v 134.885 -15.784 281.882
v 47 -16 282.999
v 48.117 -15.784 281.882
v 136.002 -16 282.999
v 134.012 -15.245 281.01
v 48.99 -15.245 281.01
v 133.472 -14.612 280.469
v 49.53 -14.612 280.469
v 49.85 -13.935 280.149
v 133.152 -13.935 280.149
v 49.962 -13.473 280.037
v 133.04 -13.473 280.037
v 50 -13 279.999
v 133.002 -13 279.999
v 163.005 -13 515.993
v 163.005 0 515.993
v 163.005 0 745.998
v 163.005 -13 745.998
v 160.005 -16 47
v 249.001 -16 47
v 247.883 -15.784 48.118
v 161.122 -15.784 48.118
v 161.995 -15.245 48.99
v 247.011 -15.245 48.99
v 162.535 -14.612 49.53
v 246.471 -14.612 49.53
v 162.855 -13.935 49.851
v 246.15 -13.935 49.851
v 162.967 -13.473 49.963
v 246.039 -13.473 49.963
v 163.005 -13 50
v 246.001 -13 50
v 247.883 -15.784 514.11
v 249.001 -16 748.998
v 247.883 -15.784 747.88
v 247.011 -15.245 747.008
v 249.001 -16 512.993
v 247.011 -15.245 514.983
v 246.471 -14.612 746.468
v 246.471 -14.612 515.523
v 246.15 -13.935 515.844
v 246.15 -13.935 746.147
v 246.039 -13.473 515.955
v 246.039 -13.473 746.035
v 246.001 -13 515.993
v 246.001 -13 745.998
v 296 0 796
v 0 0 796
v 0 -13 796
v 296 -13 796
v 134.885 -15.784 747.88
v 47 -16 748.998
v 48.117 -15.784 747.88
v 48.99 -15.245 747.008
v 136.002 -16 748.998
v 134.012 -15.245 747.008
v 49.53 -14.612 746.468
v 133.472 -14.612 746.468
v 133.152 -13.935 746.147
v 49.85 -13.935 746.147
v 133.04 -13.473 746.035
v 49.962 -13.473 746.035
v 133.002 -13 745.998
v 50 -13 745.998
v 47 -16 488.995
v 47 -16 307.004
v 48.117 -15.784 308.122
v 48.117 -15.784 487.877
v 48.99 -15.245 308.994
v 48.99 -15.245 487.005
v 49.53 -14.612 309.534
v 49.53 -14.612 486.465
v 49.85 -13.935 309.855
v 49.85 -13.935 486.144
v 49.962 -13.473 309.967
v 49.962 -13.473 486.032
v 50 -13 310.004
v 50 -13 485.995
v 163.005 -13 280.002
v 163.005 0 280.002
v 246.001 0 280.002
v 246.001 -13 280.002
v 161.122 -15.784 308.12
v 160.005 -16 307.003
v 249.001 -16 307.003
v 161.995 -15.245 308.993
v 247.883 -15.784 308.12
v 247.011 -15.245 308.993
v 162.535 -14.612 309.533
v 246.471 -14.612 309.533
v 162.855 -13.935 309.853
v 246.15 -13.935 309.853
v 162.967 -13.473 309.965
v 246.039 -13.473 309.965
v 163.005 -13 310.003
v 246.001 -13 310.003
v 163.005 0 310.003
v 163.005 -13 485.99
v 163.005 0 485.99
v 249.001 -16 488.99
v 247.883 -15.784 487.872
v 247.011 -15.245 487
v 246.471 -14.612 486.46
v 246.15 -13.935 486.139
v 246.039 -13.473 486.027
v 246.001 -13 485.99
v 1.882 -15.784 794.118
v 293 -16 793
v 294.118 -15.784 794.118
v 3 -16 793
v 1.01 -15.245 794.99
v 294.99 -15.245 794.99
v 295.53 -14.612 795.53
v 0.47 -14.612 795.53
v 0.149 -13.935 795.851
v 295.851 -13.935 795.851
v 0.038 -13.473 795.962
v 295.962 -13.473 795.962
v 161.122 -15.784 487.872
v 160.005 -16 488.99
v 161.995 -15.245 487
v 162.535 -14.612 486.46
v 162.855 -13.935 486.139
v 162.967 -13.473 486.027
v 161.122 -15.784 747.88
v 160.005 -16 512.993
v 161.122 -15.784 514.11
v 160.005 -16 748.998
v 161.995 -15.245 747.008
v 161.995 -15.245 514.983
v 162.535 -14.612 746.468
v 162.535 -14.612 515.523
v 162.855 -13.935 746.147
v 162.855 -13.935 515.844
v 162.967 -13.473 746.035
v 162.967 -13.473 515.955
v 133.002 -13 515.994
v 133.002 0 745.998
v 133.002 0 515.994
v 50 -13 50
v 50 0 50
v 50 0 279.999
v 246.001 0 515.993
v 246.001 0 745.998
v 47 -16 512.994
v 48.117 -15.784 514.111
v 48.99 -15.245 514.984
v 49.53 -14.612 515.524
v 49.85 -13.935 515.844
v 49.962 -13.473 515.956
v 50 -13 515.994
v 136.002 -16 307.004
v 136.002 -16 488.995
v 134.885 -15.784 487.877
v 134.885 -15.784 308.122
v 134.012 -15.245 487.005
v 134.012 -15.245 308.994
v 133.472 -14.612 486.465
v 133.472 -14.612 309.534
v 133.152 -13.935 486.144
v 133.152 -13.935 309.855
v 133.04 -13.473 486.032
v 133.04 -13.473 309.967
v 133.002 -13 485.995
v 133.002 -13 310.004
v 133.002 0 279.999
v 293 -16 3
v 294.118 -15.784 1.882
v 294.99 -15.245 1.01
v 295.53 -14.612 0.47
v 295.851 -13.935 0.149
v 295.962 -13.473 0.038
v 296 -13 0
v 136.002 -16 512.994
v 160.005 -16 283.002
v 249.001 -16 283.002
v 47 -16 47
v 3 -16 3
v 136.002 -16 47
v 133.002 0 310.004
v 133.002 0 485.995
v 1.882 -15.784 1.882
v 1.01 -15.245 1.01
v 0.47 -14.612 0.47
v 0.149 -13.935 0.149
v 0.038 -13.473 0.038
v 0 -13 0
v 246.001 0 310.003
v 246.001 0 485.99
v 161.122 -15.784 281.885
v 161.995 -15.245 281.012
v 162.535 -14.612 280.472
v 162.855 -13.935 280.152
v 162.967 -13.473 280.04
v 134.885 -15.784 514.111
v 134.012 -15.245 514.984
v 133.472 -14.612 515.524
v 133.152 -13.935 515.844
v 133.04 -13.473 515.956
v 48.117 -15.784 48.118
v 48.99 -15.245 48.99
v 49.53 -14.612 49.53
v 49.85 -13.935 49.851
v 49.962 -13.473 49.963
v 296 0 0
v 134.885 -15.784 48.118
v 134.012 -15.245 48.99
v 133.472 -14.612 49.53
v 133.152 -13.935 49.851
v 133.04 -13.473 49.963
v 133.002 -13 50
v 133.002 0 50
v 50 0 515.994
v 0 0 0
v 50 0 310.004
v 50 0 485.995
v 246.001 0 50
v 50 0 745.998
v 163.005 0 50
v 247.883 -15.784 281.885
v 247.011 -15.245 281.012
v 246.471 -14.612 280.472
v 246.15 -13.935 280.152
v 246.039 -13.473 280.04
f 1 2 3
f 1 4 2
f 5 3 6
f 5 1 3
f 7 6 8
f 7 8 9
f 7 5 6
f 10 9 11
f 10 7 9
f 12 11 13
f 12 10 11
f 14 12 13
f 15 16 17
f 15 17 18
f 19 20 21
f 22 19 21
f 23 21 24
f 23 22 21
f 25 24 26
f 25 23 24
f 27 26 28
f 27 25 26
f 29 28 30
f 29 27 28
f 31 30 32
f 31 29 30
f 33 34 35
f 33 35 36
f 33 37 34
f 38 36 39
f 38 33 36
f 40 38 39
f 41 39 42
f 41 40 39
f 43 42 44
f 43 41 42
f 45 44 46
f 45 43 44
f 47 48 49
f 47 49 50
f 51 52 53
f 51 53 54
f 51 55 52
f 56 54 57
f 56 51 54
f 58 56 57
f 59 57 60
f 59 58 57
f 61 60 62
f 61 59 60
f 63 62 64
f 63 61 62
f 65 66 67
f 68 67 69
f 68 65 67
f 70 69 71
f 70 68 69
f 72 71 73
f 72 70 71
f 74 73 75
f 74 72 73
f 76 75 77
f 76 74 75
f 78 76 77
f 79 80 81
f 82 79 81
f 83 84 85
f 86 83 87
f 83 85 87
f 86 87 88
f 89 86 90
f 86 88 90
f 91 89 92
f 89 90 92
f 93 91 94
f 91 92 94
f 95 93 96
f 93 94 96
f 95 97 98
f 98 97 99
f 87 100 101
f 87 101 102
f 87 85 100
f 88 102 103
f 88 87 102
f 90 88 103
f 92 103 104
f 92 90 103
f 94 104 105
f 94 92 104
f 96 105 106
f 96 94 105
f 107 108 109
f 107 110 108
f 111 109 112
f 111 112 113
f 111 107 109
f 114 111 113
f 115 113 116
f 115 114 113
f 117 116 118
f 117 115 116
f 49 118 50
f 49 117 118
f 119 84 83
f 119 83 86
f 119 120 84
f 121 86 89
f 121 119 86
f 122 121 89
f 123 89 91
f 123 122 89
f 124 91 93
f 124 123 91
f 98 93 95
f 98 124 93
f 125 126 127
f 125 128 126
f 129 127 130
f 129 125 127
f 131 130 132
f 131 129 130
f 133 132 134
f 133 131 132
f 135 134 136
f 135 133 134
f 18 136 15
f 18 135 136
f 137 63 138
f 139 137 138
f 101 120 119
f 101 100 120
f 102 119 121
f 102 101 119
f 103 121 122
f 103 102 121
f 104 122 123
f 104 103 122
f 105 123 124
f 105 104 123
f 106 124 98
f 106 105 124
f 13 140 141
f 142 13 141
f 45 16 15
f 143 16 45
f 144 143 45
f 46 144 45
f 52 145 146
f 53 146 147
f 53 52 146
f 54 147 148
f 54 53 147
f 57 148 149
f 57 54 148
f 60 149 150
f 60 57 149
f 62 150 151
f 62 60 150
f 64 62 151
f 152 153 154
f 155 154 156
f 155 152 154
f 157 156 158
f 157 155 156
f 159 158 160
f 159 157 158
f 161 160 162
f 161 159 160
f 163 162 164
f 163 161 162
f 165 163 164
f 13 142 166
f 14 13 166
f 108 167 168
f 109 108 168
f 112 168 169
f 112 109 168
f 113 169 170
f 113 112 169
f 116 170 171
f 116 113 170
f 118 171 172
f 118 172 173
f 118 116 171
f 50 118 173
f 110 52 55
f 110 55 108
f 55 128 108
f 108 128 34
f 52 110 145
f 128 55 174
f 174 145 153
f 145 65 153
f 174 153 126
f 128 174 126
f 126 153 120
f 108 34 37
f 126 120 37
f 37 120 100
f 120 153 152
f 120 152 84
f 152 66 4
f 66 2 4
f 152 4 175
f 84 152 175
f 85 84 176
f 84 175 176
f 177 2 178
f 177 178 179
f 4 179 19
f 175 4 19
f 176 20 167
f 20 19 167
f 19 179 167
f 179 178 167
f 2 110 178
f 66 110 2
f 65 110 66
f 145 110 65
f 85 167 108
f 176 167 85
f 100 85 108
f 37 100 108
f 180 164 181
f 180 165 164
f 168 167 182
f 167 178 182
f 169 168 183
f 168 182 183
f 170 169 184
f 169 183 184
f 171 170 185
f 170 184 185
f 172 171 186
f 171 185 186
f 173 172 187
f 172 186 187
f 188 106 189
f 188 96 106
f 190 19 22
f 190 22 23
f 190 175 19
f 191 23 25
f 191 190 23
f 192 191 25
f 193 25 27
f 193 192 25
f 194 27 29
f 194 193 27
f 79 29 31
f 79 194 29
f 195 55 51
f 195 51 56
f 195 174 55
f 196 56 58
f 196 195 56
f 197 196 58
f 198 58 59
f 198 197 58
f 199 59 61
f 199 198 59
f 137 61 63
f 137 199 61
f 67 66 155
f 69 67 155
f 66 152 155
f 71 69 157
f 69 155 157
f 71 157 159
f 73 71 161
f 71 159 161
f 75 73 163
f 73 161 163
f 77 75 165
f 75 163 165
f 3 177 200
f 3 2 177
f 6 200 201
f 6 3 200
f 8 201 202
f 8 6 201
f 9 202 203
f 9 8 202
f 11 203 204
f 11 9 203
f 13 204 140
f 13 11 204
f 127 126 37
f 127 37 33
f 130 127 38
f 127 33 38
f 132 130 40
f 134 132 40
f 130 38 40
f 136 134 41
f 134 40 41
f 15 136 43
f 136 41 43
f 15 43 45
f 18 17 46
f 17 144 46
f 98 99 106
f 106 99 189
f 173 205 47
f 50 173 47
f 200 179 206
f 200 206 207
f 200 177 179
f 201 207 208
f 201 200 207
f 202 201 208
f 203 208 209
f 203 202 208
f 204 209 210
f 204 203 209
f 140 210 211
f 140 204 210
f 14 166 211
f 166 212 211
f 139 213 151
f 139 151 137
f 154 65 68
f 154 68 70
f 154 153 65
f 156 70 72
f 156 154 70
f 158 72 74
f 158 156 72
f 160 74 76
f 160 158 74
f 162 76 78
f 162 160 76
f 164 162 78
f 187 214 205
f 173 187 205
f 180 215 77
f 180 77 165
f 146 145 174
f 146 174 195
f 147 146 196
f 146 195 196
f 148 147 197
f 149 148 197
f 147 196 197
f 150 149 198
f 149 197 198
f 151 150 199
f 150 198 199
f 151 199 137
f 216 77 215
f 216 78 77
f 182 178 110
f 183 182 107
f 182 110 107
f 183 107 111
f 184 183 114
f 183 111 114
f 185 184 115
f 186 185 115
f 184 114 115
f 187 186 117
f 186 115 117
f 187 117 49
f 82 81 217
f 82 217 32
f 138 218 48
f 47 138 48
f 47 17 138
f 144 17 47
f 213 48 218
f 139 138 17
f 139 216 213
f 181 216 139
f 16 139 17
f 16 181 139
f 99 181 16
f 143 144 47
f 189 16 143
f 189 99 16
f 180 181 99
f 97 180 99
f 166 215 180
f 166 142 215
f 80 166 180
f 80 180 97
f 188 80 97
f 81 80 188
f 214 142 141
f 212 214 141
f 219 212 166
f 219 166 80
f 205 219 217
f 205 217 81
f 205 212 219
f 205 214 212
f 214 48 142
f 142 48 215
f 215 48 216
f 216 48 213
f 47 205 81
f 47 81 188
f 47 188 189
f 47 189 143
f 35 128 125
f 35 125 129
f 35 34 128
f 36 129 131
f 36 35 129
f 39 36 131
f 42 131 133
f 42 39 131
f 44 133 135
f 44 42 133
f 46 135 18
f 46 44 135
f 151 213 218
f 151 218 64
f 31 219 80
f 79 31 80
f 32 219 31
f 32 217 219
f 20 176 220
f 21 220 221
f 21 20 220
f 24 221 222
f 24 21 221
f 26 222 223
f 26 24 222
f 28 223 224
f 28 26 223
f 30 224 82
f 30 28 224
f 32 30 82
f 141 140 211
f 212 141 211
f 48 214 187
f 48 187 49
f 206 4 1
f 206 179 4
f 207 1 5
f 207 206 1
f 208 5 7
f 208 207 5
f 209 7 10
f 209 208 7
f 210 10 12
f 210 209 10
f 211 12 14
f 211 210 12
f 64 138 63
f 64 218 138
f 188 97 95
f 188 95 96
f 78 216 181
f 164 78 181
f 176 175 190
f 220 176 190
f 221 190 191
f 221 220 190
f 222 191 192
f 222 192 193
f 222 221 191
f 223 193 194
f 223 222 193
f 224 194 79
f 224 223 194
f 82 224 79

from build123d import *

# Parameters (mm, degrees)
F0_W      = 28.8499742746
F0_H      = 37.8827601671
F1_DEPTH  = 16
F2_DEPTH  = 296
F3_DEPTH  = 996
F4_W      = 199.8313069344
F4_H      = 801.1276721954
F5_DEPTH  = 5
F6_DEPTH  = 39.21
F7_DEPTH  = 2.24
F8_DEPTH  = 55.66
F9_DEPTH  = 1.59
F10_W     = 54.77245152
F10_H     = 895.9976721954
F11_DEPTH = 5
F12_DEPTH = 5.86
F13_DEPTH = 18.91
F14_W     = 83.0026693535
F14_H     = 34.9487662315
F14_H_2   = 55.274695158
F15_W     = 82.9961860609
F15_H     = 44.8832511902
F15_H_2   = 52.5203943253
F16_DEPTH = 5
F17_DEPTH = 300
F18_DEPTH = 300
F19_DEPTH = 324.79
F20_DEPTH = 324.79
F21_DEPTH = 250
F22_DEPTH = 250
F23_DEPTH = 100
F24_DEPTH = 100
F25_DEPTH = 50
F26_DEPTH = 50
F27_DEPTH = 134.02
F28_DEPTH = 100
F29_DEPTH = 100
F30_DEPTH = 100
F31_DEPTH = 50
F32_DEPTH = 54.95
F33_DEPTH = 50
F34_DEPTH = 109.29
F35_DEPTH = 14.88
F36_DEPTH = 230.15
F37_DEPTH = 230.15
F38_DEPTH = 22.52
F39_DEPTH = 77.2
F40_DEPTH = 77.2
F41_DEPTH = 11
F42_DEPTH = 200
F43_DEPTH = 200
F44_DEPTH = 200
F45_DEPTH = 70
F46_DEPTH = 70
F47_DEPTH = 70
F48_DEPTH = 70
F49_R     = 3


with BuildPart() as f1:
    # F0 (on Front) → F1 (new body)
    with BuildSketch(Plane.XZ):
        with Locations((14.4249871373, 18.9413800836)):
            Rectangle(F0_W, F0_H)
    extrude(amount=F1_DEPTH)

    # F2 (add): a face of the model
    f2_faces = [f1.faces().sort_by_distance(p)[0] for p in [
        (0, -8, 18.9413800836),
    ]]
    extrude(f2_faces, amount=-F2_DEPTH)

    # F3 (add): a face of the model
    f3_faces = [f1.faces().sort_by_distance(p)[0] for p in [
        (148, -8, 0),
    ]]
    extrude(f3_faces, amount=-F3_DEPTH)

    # F4 (on face) → F5 (cut)
    with BuildSketch(Plane.XZ.offset(16)):
        with Locations((148.3252942562, 506.2239170074)):
            Rectangle(F4_W, F4_H)
    extrude(amount=-F5_DEPTH, mode=Mode.SUBTRACT)

    # F6 (cut): a face of the model
    f6_faces = [f1.faces().sort_by_distance(p)[0] for p in [
        (148.3252942562, -13.5, 906.7877531052),
    ]]
    extrude(f6_faces, amount=-F6_DEPTH, mode=Mode.SUBTRACT)

    # F7 (add): a face of the model
    f7_faces = [f1.faces().sort_by_distance(p)[0] for p in [
        (248.2409477234, -13.5, 525.8289170074),
    ]]
    extrude(f7_faces, amount=F7_DEPTH)

    # F8 (cut): a face of the model
    f8_faces = [f1.faces().sort_by_distance(p)[0] for p in [
        (147.2052942562, -13.5, 105.6600809097),
    ]]
    extrude(f8_faces, amount=-F8_DEPTH, mode=Mode.SUBTRACT)

    # F9 (add): a face of the model
    f9_faces = [f1.faces().sort_by_distance(p)[0] for p in [
        (48.409640789, -13.5, 497.9989170074),
    ]]
    extrude(f9_faces, amount=F9_DEPTH)

    # F10 (on face) → F11 (join)
    with BuildSketch(Plane.XZ.offset(11)):
        with Locations((154.5285359025, 497.9989170074)):
            Rectangle(F10_W, F10_H)
    extrude(amount=F11_DEPTH)

    # F12 (cut): a face of the model
    f12_faces = [f1.faces().sort_by_distance(p)[0] for p in [
        (127.1423101425, -13.5, 497.9989170074),
    ]]
    extrude(f12_faces, amount=-F12_DEPTH, mode=Mode.SUBTRACT)

    # F13 (cut): a face of the model
    f13_faces = [f1.faces().sort_by_distance(p)[0] for p in [
        (181.9147616625, -13.5, 497.9989170074),
    ]]
    extrude(f13_faces, amount=-F13_DEPTH, mode=Mode.SUBTRACT)

    # F14 (on face) + F15 (on face) → F16 (join)
    with BuildSketch(Plane.XZ.offset(11)):
        with Locations((91.5009754658, 853.3093035221)):
            Rectangle(F14_W, F14_H)
        with Locations((91.5009754658, 511.6568356752)):
            Rectangle(F14_W, F14_H_2)
    with BuildSketch(Plane.XZ.offset(11)):
        with Locations((204.5028546929, 853.7013530731)):
            Rectangle(F15_W, F15_H)
        with Locations((204.5028546929, 576.5425562859)):
            Rectangle(F15_W, F15_H_2)
    extrude(amount=F16_DEPTH)

    # F17 (add): faces of the model
    f17_faces = [f1.faces().sort_by_distance(p)[0] for p in [
        (204.5028546929, -13.5, 550.2823591232),
        (91.5009754658, -13.5, 484.0194880962),
    ]]
    extrude(f17_faces, amount=F17_DEPTH)

    # F18 (cut): faces of the model
    f18_faces = [f1.faces().sort_by_distance(p)[0] for p in [
        (91.5009754658, -13.5, 539.2941832542),
        (204.5028546929, -13.5, 602.8027534485),
    ]]
    extrude(f18_faces, amount=-F18_DEPTH, mode=Mode.SUBTRACT)

    # F19 (add): a face of the model
    f19_faces = [f1.faces().sort_by_distance(p)[0] for p in [
        (91.5009754658, -13.5, 835.8349204063),
    ]]
    extrude(f19_faces, amount=F19_DEPTH)

    # F20 (cut): a face of the model
    f20_faces = [f1.faces().sort_by_distance(p)[0] for p in [
        (91.5009754658, -13.5, 870.7836866379),
    ]]
    extrude(f20_faces, amount=-F20_DEPTH, mode=Mode.SUBTRACT)

    # F21 (add): a face of the model
    f21_faces = [f1.faces().sort_by_distance(p)[0] for p in [
        (91.5009754658, -13.5, 239.2941832542),
    ]]
    extrude(f21_faces, amount=F21_DEPTH)

    # F22 (cut): a face of the model
    f22_faces = [f1.faces().sort_by_distance(p)[0] for p in [
        (91.5009754658, -13.5, 184.0194880962),
    ]]
    extrude(f22_faces, amount=-F22_DEPTH, mode=Mode.SUBTRACT)

    # F23 (add): a face of the model
    f23_faces = [f1.faces().sort_by_distance(p)[0] for p in [
        (91.5009754658, -13.5, 545.9936866379),
    ]]
    extrude(f23_faces, amount=F23_DEPTH)

    # F24 (cut): a face of the model
    f24_faces = [f1.faces().sort_by_distance(p)[0] for p in [
        (91.5009754658, -13.5, 511.0449204063),
    ]]
    extrude(f24_faces, amount=-F24_DEPTH, mode=Mode.SUBTRACT)

    # F25 (add): a face of the model
    f25_faces = [f1.faces().sort_by_distance(p)[0] for p in [
        (91.5009754658, -13.5, 645.9936866379),
    ]]
    extrude(f25_faces, amount=F25_DEPTH)

    # F26 (cut): a face of the model
    f26_faces = [f1.faces().sort_by_distance(p)[0] for p in [
        (91.5009754658, -13.5, 611.0449204063),
    ]]
    extrude(f26_faces, amount=-F26_DEPTH, mode=Mode.SUBTRACT)

    # F27 (add): a face of the model
    f27_faces = [f1.faces().sort_by_distance(p)[0] for p in [
        (91.5009754658, -13.5, 434.0194880962),
    ]]
    extrude(f27_faces, amount=F27_DEPTH)

    # F28 (cut): a face of the model
    f28_faces = [f1.faces().sort_by_distance(p)[0] for p in [
        (91.5009754658, -13.5, 299.9994880962),
    ]]
    extrude(f28_faces, amount=-F28_DEPTH, mode=Mode.SUBTRACT)

    # F29 (add): a face of the model
    f29_faces = [f1.faces().sort_by_distance(p)[0] for p in [
        (91.5009754658, -13.5, 661.0449204063),
    ]]
    extrude(f29_faces, amount=F29_DEPTH)

    # F30 (cut): a face of the model
    f30_faces = [f1.faces().sort_by_distance(p)[0] for p in [
        (91.5009754658, -13.5, 695.9936866379),
    ]]
    extrude(f30_faces, amount=-F30_DEPTH, mode=Mode.SUBTRACT)

    # F31 (add): a face of the model
    f31_faces = [f1.faces().sort_by_distance(p)[0] for p in [
        (91.5009754658, -13.5, 595.9936866379),
    ]]
    extrude(f31_faces, amount=F31_DEPTH)

    # F32 (cut): a face of the model
    f32_faces = [f1.faces().sort_by_distance(p)[0] for p in [
        (91.5009754658, -13.5, 561.0449204063),
    ]]
    extrude(f32_faces, amount=-F32_DEPTH, mode=Mode.SUBTRACT)

    # F33 (add): a face of the model
    f33_faces = [f1.faces().sort_by_distance(p)[0] for p in [
        (91.5009754658, -13.5, 399.9994880962),
    ]]
    extrude(f33_faces, amount=F33_DEPTH)

    # F34 (cut): a face of the model
    f34_faces = [f1.faces().sort_by_distance(p)[0] for p in [
        (91.5009754658, -13.5, 489.2941832542),
    ]]
    extrude(f34_faces, amount=-F34_DEPTH, mode=Mode.SUBTRACT)

    # F35 (cut): a face of the model
    f35_faces = [f1.faces().sort_by_distance(p)[0] for p in [
        (204.5028546929, -13.5, 831.259727478),
    ]]
    extrude(f35_faces, amount=-F35_DEPTH, mode=Mode.SUBTRACT)

    # F36 (add): a face of the model
    f36_faces = [f1.faces().sort_by_distance(p)[0] for p in [
        (204.5028546929, -13.5, 846.139727478),
    ]]
    extrude(f36_faces, amount=F36_DEPTH)

    # F37 (cut): a face of the model
    f37_faces = [f1.faces().sort_by_distance(p)[0] for p in [
        (204.5028546929, -13.5, 876.1429786682),
    ]]
    extrude(f37_faces, amount=-F37_DEPTH, mode=Mode.SUBTRACT)

    # F38 (cut): a face of the model
    f38_faces = [f1.faces().sort_by_distance(p)[0] for p in [
        (204.5028546929, -13.5, 250.2823591232),
    ]]
    extrude(f38_faces, amount=-F38_DEPTH, mode=Mode.SUBTRACT)

    # F39 (add): a face of the model
    f39_faces = [f1.faces().sort_by_distance(p)[0] for p in [
        (204.5028546929, -13.5, 302.8027534485),
    ]]
    extrude(f39_faces, amount=F39_DEPTH)

    # F40 (cut): a face of the model
    f40_faces = [f1.faces().sort_by_distance(p)[0] for p in [
        (204.5028546929, -13.5, 272.8023591232),
    ]]
    extrude(f40_faces, amount=-F40_DEPTH, mode=Mode.SUBTRACT)

    # F41 (cut): faces of the model
    f41_faces = [f1.faces().sort_by_distance(p)[0] for p in [
        (91.5009754658, -11, 795.9957198715),
        (204.5028546929, -11, 795.9953658867),
        (204.5028546929, -11, 497.9962404633),
        (91.5009754658, -11, 497.9995518303),
        (91.5009754658, -11, 199.999784503),
        (204.5028546929, -11, 200.0012200165),
    ]]
    extrude(f41_faces, amount=-F41_DEPTH, mode=Mode.SUBTRACT)

    # F42 (add): faces of the model
    f42_faces = [f1.faces().sort_by_distance(p)[0] for p in [
        (204.5028546929, -8, 615.989727478),
        (91.5009754658, -8, 615.9949204063),
    ]]
    extrude(f42_faces, amount=F42_DEPTH)

    # F43 (add): faces of the model
    f43_faces = [f1.faces().sort_by_distance(p)[0] for p in [
        (91.5009754658, -8, 945.9977531052),
        (204.5028546929, -8, 945.9977531052),
    ]]
    extrude(f43_faces, amount=F43_DEPTH)

    # F44 (cut): faces of the model
    f44_faces = [f1.faces().sort_by_distance(p)[0] for p in [
        (148, -8, 996),
        (91.5009754658, -8, 645.9936866379),
        (204.5028546929, -8, 645.9929786682),
    ]]
    extrude(f44_faces, amount=-F44_DEPTH, mode=Mode.SUBTRACT)

    # F45 (add): faces of the model
    f45_faces = [f1.faces().sort_by_distance(p)[0] for p in [
        (204.5028546929, -8, 350.0023591232),
        (91.5009754658, -8, 349.9994880962),
    ]]
    extrude(f45_faces, amount=F45_DEPTH)

    # F46 (cut): faces of the model
    f46_faces = [f1.faces().sort_by_distance(p)[0] for p in [
        (204.5028546929, -8, 380.0027534485),
        (91.5009754658, -8, 380.0041832542),
    ]]
    extrude(f46_faces, amount=-F46_DEPTH, mode=Mode.SUBTRACT)

    # F47 (add): faces of the model
    f47_faces = [f1.faces().sort_by_distance(p)[0] for p in [
        (204.5028546929, -8, 445.9929786682),
        (91.5009754658, -8, 445.9936866379),
    ]]
    extrude(f47_faces, amount=F47_DEPTH)

    # F48 (cut): faces of the model
    f48_faces = [f1.faces().sort_by_distance(p)[0] for p in [
        (204.5028546929, -8, 415.989727478),
        (91.5009754658, -8, 415.9949204063),
    ]]
    extrude(f48_faces, amount=-F48_DEPTH, mode=Mode.SUBTRACT)

    # F49
    f49_edges = [f1.edges().sort_by_distance(p)[0] for p in [
        (0, -16, 398),
        (148, -16, 0),
        (296, -16, 398),
        (148, -16, 796),
        (133.00231, -16, 164.999785),
        (91.500975, -16, 50.000081),
        (49.999641, -16, 164.999785),
        (91.500975, -16, 279.999488),
        (246.000948, -16, 165.00122),
        (204.502855, -16, 50.000081),
        (163.004762, -16, 165.00122),
        (204.502855, -16, 280.002359),
        (204.502855, -16, 310.002753),
        (163.004762, -16, 397.99624),
        (204.502855, -16, 485.989727),
        (246.000948, -16, 397.99624),
        (49.999641, -16, 397.999552),
        (91.500975, -16, 485.99492),
        (133.00231, -16, 397.999552),
        (91.500975, -16, 310.004183),
        (49.999641, -16, 630.99572),
        (91.500975, -16, 745.997753),
        (133.00231, -16, 630.99572),
        (91.500975, -16, 515.993687),
        (163.004762, -16, 630.995366),
        (204.502855, -16, 745.997753),
        (246.000948, -16, 630.995366),
        (204.502855, -16, 515.992979),
    ]]
    fillet(f49_edges, radius=F49_R)


solid = f1.part
